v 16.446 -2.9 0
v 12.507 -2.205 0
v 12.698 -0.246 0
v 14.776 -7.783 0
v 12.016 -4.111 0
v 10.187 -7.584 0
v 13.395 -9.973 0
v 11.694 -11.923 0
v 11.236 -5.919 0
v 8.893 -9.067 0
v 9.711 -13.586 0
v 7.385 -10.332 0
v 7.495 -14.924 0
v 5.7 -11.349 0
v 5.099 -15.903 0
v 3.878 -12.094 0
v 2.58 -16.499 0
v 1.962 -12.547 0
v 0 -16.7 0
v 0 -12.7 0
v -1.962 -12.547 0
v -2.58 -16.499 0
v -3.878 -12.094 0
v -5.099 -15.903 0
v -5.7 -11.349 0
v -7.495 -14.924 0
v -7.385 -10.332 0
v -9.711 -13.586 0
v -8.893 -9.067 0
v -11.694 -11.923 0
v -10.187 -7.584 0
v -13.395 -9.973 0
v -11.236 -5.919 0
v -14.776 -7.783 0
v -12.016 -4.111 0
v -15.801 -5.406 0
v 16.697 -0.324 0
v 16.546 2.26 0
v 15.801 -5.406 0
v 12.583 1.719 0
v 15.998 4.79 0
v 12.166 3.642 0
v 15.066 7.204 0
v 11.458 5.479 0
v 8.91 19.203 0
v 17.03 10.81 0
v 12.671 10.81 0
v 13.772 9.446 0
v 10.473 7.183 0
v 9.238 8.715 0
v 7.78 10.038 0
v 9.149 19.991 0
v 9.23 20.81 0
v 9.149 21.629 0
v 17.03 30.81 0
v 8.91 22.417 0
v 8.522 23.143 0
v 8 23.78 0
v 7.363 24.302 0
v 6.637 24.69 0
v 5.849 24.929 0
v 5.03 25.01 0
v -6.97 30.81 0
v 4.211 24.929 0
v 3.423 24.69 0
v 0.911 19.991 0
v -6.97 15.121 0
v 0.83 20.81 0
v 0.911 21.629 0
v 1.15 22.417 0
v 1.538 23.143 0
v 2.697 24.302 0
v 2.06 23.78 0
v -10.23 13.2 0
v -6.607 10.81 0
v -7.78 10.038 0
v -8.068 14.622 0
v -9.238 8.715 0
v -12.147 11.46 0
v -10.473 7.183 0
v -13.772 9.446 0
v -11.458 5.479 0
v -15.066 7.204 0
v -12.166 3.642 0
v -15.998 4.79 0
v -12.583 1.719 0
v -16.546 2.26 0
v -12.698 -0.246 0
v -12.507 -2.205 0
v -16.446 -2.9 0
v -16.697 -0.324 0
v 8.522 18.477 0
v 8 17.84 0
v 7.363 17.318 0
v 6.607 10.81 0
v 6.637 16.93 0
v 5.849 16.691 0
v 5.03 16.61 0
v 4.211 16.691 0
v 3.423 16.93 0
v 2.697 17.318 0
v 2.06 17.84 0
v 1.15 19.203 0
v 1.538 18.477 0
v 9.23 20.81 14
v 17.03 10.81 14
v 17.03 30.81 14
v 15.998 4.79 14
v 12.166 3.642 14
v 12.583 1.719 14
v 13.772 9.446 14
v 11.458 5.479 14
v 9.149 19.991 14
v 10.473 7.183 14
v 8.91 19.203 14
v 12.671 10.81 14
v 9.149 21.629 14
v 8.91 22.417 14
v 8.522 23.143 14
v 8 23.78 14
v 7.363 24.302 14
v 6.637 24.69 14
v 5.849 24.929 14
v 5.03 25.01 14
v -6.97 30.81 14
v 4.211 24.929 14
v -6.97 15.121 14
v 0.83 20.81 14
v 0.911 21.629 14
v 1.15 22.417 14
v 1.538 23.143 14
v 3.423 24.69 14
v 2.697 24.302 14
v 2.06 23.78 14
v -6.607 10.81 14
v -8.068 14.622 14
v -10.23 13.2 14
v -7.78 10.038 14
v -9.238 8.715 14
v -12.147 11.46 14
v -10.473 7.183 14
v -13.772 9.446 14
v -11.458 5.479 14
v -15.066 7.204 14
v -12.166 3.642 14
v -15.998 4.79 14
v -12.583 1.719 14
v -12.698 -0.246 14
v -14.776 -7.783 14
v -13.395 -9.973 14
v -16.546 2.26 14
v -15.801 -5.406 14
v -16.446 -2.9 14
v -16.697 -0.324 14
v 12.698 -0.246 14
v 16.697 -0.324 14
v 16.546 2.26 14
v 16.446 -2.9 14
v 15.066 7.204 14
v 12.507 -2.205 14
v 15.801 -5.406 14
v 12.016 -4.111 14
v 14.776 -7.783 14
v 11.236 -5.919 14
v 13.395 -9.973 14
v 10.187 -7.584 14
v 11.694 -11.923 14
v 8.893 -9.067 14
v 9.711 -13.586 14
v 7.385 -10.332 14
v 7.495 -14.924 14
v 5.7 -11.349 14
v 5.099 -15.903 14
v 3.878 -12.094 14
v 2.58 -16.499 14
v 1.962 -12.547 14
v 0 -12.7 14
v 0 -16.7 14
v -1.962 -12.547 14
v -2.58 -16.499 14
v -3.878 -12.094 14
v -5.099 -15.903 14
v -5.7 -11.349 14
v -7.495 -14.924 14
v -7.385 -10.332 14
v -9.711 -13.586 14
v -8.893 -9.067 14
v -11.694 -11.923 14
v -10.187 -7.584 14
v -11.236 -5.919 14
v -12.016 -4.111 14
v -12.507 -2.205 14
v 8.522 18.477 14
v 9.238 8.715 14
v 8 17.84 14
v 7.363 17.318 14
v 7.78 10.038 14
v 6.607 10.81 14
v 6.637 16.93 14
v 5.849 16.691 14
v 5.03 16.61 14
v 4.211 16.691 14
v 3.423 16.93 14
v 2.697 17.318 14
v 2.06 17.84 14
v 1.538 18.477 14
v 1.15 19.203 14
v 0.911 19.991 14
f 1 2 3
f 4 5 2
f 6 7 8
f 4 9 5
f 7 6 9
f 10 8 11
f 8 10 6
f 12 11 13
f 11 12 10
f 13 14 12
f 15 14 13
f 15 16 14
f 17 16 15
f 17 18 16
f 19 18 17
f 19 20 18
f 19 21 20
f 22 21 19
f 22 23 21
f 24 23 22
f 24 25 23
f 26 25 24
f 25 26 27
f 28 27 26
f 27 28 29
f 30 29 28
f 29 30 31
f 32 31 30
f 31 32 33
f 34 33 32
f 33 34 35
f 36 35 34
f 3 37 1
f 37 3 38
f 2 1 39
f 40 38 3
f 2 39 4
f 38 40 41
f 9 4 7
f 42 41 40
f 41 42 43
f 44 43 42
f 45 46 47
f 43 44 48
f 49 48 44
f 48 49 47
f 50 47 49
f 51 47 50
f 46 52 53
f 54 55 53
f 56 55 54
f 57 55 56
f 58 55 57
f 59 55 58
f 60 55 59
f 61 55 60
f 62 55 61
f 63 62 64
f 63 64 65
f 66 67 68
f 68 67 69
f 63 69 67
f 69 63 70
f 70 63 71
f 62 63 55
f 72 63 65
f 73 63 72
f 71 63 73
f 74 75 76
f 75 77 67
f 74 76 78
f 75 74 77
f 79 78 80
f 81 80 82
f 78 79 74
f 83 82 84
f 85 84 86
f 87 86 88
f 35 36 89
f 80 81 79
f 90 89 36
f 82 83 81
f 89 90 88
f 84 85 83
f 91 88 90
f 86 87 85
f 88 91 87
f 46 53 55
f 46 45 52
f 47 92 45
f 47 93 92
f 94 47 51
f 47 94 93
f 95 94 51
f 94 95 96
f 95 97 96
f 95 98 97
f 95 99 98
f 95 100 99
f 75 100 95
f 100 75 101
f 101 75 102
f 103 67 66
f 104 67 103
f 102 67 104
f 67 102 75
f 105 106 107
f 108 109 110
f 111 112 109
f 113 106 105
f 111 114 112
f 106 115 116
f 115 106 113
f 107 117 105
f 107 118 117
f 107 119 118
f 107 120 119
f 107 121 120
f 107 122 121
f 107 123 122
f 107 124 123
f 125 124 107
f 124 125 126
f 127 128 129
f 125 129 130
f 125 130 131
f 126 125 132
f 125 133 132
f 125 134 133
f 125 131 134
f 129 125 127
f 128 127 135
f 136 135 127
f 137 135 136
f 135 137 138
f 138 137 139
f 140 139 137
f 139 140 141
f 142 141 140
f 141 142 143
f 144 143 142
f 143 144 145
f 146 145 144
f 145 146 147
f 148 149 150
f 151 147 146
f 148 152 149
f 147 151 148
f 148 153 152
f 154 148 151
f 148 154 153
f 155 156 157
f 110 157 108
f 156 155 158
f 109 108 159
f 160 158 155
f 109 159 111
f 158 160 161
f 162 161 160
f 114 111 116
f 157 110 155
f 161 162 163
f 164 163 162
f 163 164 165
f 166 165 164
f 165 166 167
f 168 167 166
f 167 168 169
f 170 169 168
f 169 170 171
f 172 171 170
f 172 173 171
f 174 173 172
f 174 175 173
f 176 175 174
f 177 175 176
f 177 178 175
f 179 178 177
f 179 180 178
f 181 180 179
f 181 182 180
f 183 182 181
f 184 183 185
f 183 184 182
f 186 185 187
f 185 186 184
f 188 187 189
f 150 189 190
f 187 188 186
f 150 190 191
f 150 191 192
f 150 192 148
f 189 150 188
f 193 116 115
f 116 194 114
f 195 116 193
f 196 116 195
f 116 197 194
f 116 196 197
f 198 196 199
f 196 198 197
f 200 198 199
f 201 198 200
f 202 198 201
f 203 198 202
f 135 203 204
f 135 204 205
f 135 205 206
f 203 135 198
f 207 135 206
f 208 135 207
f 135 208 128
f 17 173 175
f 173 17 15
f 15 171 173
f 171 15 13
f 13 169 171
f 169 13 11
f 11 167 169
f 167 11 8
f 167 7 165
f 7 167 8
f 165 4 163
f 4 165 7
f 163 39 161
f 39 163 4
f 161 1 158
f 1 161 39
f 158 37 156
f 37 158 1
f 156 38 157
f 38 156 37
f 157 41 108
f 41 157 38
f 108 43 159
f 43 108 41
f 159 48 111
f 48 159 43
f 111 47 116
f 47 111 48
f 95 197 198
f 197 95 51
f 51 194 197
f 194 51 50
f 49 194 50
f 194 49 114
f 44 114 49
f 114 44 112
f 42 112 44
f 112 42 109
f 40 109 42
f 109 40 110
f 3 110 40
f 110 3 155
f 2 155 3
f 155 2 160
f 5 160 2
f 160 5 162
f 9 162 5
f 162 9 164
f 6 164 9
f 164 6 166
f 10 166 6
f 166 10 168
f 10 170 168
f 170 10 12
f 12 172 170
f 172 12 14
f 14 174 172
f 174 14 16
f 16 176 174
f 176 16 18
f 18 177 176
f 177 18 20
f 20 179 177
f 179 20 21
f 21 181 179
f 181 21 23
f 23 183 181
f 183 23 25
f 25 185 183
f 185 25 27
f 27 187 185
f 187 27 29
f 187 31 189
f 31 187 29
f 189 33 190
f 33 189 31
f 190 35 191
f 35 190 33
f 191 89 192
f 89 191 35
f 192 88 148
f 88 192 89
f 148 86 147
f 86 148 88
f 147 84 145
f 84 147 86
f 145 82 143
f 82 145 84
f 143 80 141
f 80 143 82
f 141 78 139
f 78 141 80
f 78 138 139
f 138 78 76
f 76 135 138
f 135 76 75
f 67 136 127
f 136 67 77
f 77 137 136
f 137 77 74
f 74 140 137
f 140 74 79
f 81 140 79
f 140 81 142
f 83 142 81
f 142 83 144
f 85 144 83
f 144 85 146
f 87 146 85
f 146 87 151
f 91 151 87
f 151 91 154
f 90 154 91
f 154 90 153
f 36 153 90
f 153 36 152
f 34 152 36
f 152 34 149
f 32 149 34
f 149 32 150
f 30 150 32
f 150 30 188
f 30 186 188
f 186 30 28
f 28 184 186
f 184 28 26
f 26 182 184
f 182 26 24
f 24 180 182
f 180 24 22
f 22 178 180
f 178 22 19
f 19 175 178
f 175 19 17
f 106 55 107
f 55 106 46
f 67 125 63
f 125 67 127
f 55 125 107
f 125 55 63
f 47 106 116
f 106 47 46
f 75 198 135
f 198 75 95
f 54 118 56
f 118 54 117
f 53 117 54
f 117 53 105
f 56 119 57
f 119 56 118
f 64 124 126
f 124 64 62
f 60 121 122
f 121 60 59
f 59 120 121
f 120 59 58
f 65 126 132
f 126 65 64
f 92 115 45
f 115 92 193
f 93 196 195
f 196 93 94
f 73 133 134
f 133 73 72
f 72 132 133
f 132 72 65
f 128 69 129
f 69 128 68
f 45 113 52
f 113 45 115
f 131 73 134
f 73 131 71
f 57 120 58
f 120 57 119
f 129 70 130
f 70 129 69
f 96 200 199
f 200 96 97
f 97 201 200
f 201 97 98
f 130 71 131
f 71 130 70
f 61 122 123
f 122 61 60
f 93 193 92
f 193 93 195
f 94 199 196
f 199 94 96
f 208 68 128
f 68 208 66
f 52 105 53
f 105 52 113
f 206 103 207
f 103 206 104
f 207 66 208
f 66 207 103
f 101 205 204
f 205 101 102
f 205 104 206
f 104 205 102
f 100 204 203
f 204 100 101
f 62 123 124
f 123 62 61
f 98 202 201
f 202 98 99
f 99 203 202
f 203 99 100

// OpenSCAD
$fn = 32;

// ----------------------------------------------------------------------
// Pipe clamp: 33.4 mm ring, 4 mm wall, 14 mm wide
// ----------------------------------------------------------------------

// --- parameters (mm) ---
outer_r = 16.7;           // clamp outside radius
inner_r = 12.7;           // pipe bore radius
band = 4;                 // band thickness
clamp_w = 14;             // clamp width
opening = 40;             // opening angle between the ends
lug_w = 24;               // lug width
lug_len = 20;             // lug length
bolt_d = 8.4;             // bolt hole

clamp_profile = [[-5.712, 15.693], [-8.068, 14.622], [-10.23, 13.2], [-12.147, 11.46], [-13.772, 9.446], [-15.066, 7.204], [-15.998, 4.79], [-16.546, 2.26], [-16.697, -0.324], [-16.446, -2.9], [-15.801, -5.406], [-14.776, -7.783], [-13.395, -9.973], [-11.694, -11.923], [-9.711, -13.586], [-7.495, -14.924], [-5.099, -15.903], [-2.58, -16.499], [0, -16.7], [2.58, -16.499], [5.099, -15.903], [7.495, -14.924], [9.711, -13.586], [11.694, -11.923], [13.395, -9.973], [14.776, -7.783], [15.801, -5.406], [16.446, -2.9], [16.697, -0.324], [16.546, 2.26], [15.998, 4.79], [15.066, 7.204], [13.772, 9.446], [12.147, 11.46], [10.23, 13.2], [8.068, 14.622], [5.712, 15.693], [4.344, 11.934], [6.136, 11.12], [7.78, 10.038], [9.238, 8.715], [10.473, 7.183], [11.458, 5.479], [12.166, 3.642], [12.583, 1.719], [12.698, -0.246], [12.507, -2.205], [12.016, -4.111], [11.236, -5.919], [10.187, -7.584], [8.893, -9.067], [7.385, -10.332], [5.7, -11.349], [3.878, -12.094], [1.962, -12.547], [0, -12.7], [-1.962, -12.547], [-3.878, -12.094], [-5.7, -11.349], [-7.385, -10.332], [-8.893, -9.067], [-10.187, -7.584], [-11.236, -5.919], [-12.016, -4.111], [-12.507, -2.205], [-12.698, -0.246], [-12.583, 1.719], [-12.166, 3.642], [-11.458, 5.479], [-10.473, 7.183], [-9.238, 8.715], [-7.78, 10.038], [-6.136, 11.12], [-4.344, 11.934]];

difference() {
  union() {
    linear_extrude(height = clamp_w) polygon(clamp_profile);
    /* bolt lug on the other end */
    translate([-6.97, 10.81, 0]) cube([lug_w, 20, clamp_w]);
  }
  translate([5.03, 20.81, -2.5]) cylinder(h = clamp_w + 5, d = bolt_d);
}
